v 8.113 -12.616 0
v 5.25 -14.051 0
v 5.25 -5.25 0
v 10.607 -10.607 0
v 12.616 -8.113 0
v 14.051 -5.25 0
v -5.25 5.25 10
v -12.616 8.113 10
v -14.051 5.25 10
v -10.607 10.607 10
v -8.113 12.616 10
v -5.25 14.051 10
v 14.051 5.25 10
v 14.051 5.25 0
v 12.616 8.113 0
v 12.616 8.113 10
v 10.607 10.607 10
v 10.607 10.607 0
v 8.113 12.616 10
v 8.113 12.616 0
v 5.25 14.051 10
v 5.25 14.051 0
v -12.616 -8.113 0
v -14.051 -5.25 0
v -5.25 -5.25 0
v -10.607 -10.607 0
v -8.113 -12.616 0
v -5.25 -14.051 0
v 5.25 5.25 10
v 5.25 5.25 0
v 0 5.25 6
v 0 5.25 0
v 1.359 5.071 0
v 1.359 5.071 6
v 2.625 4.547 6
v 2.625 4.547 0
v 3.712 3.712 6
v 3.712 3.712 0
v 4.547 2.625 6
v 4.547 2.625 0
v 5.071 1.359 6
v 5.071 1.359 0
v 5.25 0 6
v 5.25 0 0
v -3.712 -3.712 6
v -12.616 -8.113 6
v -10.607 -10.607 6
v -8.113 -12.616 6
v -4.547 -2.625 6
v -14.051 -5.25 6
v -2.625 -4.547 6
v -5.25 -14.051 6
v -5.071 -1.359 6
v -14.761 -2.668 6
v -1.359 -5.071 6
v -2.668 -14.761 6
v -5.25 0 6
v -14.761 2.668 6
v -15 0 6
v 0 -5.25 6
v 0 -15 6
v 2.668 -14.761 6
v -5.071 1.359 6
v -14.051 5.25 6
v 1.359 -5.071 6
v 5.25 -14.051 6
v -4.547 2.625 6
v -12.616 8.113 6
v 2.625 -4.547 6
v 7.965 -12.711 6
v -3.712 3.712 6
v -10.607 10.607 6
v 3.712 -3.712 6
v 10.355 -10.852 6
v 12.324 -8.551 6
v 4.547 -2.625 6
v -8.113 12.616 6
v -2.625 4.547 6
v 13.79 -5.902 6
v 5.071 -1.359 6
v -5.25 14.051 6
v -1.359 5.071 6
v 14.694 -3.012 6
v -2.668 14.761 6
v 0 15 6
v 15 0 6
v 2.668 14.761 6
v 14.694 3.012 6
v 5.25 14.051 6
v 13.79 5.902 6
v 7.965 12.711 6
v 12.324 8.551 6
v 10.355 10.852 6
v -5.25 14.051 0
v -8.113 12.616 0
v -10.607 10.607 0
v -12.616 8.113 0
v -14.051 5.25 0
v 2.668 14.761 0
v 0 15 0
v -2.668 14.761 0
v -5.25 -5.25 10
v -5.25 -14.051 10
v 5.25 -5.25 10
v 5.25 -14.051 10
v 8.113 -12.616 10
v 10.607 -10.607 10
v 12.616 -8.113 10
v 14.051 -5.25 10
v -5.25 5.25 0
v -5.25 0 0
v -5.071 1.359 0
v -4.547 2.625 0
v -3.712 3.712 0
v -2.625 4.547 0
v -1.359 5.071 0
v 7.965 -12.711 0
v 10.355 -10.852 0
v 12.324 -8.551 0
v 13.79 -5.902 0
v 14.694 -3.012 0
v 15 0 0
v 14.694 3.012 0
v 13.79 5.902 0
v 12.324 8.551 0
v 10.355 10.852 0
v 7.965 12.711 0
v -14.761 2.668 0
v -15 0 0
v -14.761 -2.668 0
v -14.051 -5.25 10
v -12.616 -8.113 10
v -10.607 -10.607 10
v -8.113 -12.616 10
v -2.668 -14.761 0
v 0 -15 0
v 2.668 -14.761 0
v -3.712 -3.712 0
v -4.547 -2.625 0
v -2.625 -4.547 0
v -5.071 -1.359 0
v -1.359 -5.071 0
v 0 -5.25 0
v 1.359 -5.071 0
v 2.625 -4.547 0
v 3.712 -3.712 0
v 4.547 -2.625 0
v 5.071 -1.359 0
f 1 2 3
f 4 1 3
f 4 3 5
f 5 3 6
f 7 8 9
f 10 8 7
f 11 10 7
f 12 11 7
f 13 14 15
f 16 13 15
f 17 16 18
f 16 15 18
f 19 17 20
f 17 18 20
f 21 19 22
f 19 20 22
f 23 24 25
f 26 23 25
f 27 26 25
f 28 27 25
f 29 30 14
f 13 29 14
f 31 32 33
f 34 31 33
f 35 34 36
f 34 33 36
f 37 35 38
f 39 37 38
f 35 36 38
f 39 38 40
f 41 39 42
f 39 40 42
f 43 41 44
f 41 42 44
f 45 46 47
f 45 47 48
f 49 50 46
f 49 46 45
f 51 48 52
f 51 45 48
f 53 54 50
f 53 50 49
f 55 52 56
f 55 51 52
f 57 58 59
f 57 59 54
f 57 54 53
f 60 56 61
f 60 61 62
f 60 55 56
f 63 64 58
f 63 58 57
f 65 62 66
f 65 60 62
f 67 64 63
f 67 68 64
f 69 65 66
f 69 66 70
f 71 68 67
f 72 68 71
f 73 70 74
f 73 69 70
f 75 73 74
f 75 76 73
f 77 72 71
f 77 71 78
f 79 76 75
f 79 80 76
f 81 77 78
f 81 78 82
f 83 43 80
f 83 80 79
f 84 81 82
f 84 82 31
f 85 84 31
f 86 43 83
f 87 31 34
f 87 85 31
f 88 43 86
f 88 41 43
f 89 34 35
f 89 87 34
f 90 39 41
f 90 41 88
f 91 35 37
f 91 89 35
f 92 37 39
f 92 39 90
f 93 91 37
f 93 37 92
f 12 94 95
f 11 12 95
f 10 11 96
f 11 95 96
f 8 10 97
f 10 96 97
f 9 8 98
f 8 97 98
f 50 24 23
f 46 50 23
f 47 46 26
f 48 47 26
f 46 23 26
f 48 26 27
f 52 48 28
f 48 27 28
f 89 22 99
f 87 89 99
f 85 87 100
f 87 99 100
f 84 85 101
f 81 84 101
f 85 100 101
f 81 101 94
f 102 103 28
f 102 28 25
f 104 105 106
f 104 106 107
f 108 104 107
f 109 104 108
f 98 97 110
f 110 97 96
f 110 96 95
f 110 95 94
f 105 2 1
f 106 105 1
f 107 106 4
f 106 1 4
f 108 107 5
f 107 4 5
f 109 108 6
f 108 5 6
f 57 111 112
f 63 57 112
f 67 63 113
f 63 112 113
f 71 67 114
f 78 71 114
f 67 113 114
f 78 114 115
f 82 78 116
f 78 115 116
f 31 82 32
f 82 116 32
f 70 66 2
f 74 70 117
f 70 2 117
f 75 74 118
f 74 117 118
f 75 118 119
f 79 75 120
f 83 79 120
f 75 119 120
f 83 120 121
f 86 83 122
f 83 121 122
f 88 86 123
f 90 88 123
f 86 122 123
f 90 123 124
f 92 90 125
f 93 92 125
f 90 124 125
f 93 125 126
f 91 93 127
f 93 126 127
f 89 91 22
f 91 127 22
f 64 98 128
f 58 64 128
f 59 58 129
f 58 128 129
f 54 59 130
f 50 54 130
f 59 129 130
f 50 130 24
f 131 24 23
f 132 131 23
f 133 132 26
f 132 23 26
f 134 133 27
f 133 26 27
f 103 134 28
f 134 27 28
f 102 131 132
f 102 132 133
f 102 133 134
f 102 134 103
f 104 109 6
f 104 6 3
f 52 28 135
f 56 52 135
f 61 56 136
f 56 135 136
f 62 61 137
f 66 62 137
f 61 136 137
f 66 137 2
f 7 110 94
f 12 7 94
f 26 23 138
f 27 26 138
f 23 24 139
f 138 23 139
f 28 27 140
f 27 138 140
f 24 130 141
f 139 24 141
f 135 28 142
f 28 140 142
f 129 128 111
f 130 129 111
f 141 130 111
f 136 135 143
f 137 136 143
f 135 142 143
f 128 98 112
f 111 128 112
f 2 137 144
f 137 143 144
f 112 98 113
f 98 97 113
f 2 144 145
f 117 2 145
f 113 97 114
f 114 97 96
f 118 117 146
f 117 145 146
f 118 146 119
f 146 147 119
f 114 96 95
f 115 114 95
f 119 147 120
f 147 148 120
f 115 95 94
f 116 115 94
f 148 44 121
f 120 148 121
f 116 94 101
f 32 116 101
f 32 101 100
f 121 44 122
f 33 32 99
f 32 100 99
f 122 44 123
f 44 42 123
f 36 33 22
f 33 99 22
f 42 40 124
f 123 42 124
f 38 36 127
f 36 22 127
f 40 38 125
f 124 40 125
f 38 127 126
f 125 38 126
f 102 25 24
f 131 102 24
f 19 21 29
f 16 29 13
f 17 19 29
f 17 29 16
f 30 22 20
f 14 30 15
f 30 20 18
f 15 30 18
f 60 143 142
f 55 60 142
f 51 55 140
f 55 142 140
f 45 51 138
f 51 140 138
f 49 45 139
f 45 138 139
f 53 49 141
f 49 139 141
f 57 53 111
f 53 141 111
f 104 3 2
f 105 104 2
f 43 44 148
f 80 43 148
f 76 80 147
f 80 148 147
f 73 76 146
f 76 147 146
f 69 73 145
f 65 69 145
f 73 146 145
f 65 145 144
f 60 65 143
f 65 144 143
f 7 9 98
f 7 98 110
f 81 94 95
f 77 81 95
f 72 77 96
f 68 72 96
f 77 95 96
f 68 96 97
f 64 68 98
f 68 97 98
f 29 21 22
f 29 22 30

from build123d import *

# Parameters (mm, degrees)
F1_DEPTH = 6
F2_DEPTH = 10


with BuildPart() as f1:
    # F0 (on Top) → F1 (new body)
    with BuildSketch(Plane.XY):
        with BuildLine():
            Line((5.25, 5.25), (14.0512454964, 5.25))
            ThreePointArc((14.0512454964, 5.25), (10.6066017178, 10.6066017178), (5.25, 14.0512454964))
            Line((5.25, 14.0512454964), (5.25, 5.25))
        make_face()
        with BuildLine():
            Line((5.25, 5.25), (5.25, 14.0512454964))
            ThreePointArc((5.25, 14.0512454964), (0, 15), (-5.25, 14.0512454964))
            Line((-5.25, 14.0512454964), (-5.25, 5.25))
            Line((-5.25, 5.25), (1.7e-09, 5.25))
            Line((1.7e-09, 5.25), (5.25, 5.25))
        make_face()
        with BuildLine():
            Line((-5.25, 5.25), (-5.25, 14.0512454964))
            ThreePointArc((-5.25, 14.0512454964), (-10.6066017178, 10.6066017178), (-14.0512454964, 5.25))
            Line((-14.0512454964, 5.25), (-5.25, 5.25))
        make_face()
        with BuildLine():
            Line((-5.25, 5.25), (-14.0512454964, 5.25))
            ThreePointArc((-14.0512454964, 5.25), (-15, 0), (-14.0512454964, -5.25))
            Line((-14.0512454964, -5.25), (-5.25, -5.25))
            Line((-5.25, -5.25), (-5.25, -4.1e-09))
            Line((-5.25, -4.1e-09), (-5.25, 5.25))
        make_face()
        with BuildLine():
            ThreePointArc((-14.0512454964, -5.25), (-10.6066017178, -10.6066017178), (-5.25, -14.0512454964))
            Line((-5.25, -14.0512454964), (-5.25, -5.25))
            Line((-5.25, -5.25), (-14.0512454964, -5.25))
        make_face()
        with BuildLine():
            ThreePointArc((-5.25, -14.0512454964), (0, -15), (5.25, -14.0512454964))
            Line((5.25, -14.0512454964), (5.25, -5.25))
            Line((5.25, -5.25), (0, -5.25))
            Line((0, -5.25), (-5.25, -5.25))
            Line((-5.25, -5.25), (-5.25, -14.0512454964))
        make_face()
        with BuildLine():
            ThreePointArc((5.25, -14.0512454964), (10.6066017178, -10.6066017178), (14.0512454964, -5.25))
            Line((14.0512454964, -5.25), (5.25, -5.25))
            Line((5.25, -5.25), (5.25, -14.0512454964))
        make_face()
        with BuildLine():
            ThreePointArc((14.0512454964, -5.25), (14.7609058402, -2.6675192177), (15, 0))
            ThreePointArc((15, 0), (14.7609058402, 2.6675192177), (14.0512454964, 5.25))
            Line((14.0512454964, 5.25), (5.25, 5.25))
            Line((5.25, 5.25), (5.25, 0))
            Line((5.25, 0), (5.25, -5.25))
            Line((5.25, -5.25), (14.0512454964, -5.25))
        make_face()
        with BuildLine():
            Line((5.25, 0), (5.25, 5.25))
            Line((5.25, 5.25), (1.7e-09, 5.25))
            ThreePointArc((1.7e-09, 5.25), (3.7123106018, 3.7123106006), (5.25, 0))
        make_face()
        with BuildLine():
            ThreePointArc((-5.25, -4.1e-09), (-3.712310602, 3.7123106004), (1.7e-09, 5.25))
            Line((1.7e-09, 5.25), (-5.25, 5.25))
            Line((-5.25, 5.25), (-5.25, -4.1e-09))
        make_face()
        with BuildLine():
            Line((-5.25, -5.25), (0, -5.25))
            ThreePointArc((0, -5.25), (-3.7123105998, -3.7123106027), (-5.25, -4.1e-09))
            Line((-5.25, -4.1e-09), (-5.25, -5.25))
        make_face()
        with BuildLine():
            Line((0, -5.25), (5.25, -5.25))
            Line((5.25, -5.25), (5.25, 0))
            ThreePointArc((5.25, 0), (3.7123106012, -3.7123106012), (0, -5.25))
        make_face()
    extrude(amount=F1_DEPTH)


with BuildPart() as f2:
    # F0 (on Top) → F2 (new body)
    with BuildSketch(Plane.XY):
        with BuildLine():
            Line((-5.25, 5.25), (-5.25, 14.0512454964))
            ThreePointArc((-5.25, 14.0512454964), (-10.6066017178, 10.6066017178), (-14.0512454964, 5.25))
            Line((-14.0512454964, 5.25), (-5.25, 5.25))
        make_face()
    extrude(amount=F2_DEPTH)


with BuildPart() as f2b:
    # F0 (on Top) → F2, piece 2 (new body)
    with BuildSketch(Plane.XY):
        with BuildLine():
            ThreePointArc((-14.0512454964, -5.25), (-10.6066017178, -10.6066017178), (-5.25, -14.0512454964))
            Line((-5.25, -14.0512454964), (-5.25, -5.25))
            Line((-5.25, -5.25), (-14.0512454964, -5.25))
        make_face()
    extrude(amount=F2_DEPTH)


with BuildPart() as f2c:
    # F0 (on Top) → F2, piece 3 (new body)
    with BuildSketch(Plane.XY):
        with BuildLine():
            ThreePointArc((5.25, -14.0512454964), (10.6066017178, -10.6066017178), (14.0512454964, -5.25))
            Line((14.0512454964, -5.25), (5.25, -5.25))
            Line((5.25, -5.25), (5.25, -14.0512454964))
        make_face()
    extrude(amount=F2_DEPTH)


with BuildPart() as f2d:
    # F0 (on Top) → F2, piece 4 (new body)
    with BuildSketch(Plane.XY):
        with BuildLine():
            Line((5.25, 5.25), (14.0512454964, 5.25))
            ThreePointArc((14.0512454964, 5.25), (10.6066017178, 10.6066017178), (5.25, 14.0512454964))
            Line((5.25, 14.0512454964), (5.25, 5.25))
        make_face()
    extrude(amount=F2_DEPTH)


solid = Compound([f1.part, f2.part, f2b.part, f2c.part, f2d.part])
